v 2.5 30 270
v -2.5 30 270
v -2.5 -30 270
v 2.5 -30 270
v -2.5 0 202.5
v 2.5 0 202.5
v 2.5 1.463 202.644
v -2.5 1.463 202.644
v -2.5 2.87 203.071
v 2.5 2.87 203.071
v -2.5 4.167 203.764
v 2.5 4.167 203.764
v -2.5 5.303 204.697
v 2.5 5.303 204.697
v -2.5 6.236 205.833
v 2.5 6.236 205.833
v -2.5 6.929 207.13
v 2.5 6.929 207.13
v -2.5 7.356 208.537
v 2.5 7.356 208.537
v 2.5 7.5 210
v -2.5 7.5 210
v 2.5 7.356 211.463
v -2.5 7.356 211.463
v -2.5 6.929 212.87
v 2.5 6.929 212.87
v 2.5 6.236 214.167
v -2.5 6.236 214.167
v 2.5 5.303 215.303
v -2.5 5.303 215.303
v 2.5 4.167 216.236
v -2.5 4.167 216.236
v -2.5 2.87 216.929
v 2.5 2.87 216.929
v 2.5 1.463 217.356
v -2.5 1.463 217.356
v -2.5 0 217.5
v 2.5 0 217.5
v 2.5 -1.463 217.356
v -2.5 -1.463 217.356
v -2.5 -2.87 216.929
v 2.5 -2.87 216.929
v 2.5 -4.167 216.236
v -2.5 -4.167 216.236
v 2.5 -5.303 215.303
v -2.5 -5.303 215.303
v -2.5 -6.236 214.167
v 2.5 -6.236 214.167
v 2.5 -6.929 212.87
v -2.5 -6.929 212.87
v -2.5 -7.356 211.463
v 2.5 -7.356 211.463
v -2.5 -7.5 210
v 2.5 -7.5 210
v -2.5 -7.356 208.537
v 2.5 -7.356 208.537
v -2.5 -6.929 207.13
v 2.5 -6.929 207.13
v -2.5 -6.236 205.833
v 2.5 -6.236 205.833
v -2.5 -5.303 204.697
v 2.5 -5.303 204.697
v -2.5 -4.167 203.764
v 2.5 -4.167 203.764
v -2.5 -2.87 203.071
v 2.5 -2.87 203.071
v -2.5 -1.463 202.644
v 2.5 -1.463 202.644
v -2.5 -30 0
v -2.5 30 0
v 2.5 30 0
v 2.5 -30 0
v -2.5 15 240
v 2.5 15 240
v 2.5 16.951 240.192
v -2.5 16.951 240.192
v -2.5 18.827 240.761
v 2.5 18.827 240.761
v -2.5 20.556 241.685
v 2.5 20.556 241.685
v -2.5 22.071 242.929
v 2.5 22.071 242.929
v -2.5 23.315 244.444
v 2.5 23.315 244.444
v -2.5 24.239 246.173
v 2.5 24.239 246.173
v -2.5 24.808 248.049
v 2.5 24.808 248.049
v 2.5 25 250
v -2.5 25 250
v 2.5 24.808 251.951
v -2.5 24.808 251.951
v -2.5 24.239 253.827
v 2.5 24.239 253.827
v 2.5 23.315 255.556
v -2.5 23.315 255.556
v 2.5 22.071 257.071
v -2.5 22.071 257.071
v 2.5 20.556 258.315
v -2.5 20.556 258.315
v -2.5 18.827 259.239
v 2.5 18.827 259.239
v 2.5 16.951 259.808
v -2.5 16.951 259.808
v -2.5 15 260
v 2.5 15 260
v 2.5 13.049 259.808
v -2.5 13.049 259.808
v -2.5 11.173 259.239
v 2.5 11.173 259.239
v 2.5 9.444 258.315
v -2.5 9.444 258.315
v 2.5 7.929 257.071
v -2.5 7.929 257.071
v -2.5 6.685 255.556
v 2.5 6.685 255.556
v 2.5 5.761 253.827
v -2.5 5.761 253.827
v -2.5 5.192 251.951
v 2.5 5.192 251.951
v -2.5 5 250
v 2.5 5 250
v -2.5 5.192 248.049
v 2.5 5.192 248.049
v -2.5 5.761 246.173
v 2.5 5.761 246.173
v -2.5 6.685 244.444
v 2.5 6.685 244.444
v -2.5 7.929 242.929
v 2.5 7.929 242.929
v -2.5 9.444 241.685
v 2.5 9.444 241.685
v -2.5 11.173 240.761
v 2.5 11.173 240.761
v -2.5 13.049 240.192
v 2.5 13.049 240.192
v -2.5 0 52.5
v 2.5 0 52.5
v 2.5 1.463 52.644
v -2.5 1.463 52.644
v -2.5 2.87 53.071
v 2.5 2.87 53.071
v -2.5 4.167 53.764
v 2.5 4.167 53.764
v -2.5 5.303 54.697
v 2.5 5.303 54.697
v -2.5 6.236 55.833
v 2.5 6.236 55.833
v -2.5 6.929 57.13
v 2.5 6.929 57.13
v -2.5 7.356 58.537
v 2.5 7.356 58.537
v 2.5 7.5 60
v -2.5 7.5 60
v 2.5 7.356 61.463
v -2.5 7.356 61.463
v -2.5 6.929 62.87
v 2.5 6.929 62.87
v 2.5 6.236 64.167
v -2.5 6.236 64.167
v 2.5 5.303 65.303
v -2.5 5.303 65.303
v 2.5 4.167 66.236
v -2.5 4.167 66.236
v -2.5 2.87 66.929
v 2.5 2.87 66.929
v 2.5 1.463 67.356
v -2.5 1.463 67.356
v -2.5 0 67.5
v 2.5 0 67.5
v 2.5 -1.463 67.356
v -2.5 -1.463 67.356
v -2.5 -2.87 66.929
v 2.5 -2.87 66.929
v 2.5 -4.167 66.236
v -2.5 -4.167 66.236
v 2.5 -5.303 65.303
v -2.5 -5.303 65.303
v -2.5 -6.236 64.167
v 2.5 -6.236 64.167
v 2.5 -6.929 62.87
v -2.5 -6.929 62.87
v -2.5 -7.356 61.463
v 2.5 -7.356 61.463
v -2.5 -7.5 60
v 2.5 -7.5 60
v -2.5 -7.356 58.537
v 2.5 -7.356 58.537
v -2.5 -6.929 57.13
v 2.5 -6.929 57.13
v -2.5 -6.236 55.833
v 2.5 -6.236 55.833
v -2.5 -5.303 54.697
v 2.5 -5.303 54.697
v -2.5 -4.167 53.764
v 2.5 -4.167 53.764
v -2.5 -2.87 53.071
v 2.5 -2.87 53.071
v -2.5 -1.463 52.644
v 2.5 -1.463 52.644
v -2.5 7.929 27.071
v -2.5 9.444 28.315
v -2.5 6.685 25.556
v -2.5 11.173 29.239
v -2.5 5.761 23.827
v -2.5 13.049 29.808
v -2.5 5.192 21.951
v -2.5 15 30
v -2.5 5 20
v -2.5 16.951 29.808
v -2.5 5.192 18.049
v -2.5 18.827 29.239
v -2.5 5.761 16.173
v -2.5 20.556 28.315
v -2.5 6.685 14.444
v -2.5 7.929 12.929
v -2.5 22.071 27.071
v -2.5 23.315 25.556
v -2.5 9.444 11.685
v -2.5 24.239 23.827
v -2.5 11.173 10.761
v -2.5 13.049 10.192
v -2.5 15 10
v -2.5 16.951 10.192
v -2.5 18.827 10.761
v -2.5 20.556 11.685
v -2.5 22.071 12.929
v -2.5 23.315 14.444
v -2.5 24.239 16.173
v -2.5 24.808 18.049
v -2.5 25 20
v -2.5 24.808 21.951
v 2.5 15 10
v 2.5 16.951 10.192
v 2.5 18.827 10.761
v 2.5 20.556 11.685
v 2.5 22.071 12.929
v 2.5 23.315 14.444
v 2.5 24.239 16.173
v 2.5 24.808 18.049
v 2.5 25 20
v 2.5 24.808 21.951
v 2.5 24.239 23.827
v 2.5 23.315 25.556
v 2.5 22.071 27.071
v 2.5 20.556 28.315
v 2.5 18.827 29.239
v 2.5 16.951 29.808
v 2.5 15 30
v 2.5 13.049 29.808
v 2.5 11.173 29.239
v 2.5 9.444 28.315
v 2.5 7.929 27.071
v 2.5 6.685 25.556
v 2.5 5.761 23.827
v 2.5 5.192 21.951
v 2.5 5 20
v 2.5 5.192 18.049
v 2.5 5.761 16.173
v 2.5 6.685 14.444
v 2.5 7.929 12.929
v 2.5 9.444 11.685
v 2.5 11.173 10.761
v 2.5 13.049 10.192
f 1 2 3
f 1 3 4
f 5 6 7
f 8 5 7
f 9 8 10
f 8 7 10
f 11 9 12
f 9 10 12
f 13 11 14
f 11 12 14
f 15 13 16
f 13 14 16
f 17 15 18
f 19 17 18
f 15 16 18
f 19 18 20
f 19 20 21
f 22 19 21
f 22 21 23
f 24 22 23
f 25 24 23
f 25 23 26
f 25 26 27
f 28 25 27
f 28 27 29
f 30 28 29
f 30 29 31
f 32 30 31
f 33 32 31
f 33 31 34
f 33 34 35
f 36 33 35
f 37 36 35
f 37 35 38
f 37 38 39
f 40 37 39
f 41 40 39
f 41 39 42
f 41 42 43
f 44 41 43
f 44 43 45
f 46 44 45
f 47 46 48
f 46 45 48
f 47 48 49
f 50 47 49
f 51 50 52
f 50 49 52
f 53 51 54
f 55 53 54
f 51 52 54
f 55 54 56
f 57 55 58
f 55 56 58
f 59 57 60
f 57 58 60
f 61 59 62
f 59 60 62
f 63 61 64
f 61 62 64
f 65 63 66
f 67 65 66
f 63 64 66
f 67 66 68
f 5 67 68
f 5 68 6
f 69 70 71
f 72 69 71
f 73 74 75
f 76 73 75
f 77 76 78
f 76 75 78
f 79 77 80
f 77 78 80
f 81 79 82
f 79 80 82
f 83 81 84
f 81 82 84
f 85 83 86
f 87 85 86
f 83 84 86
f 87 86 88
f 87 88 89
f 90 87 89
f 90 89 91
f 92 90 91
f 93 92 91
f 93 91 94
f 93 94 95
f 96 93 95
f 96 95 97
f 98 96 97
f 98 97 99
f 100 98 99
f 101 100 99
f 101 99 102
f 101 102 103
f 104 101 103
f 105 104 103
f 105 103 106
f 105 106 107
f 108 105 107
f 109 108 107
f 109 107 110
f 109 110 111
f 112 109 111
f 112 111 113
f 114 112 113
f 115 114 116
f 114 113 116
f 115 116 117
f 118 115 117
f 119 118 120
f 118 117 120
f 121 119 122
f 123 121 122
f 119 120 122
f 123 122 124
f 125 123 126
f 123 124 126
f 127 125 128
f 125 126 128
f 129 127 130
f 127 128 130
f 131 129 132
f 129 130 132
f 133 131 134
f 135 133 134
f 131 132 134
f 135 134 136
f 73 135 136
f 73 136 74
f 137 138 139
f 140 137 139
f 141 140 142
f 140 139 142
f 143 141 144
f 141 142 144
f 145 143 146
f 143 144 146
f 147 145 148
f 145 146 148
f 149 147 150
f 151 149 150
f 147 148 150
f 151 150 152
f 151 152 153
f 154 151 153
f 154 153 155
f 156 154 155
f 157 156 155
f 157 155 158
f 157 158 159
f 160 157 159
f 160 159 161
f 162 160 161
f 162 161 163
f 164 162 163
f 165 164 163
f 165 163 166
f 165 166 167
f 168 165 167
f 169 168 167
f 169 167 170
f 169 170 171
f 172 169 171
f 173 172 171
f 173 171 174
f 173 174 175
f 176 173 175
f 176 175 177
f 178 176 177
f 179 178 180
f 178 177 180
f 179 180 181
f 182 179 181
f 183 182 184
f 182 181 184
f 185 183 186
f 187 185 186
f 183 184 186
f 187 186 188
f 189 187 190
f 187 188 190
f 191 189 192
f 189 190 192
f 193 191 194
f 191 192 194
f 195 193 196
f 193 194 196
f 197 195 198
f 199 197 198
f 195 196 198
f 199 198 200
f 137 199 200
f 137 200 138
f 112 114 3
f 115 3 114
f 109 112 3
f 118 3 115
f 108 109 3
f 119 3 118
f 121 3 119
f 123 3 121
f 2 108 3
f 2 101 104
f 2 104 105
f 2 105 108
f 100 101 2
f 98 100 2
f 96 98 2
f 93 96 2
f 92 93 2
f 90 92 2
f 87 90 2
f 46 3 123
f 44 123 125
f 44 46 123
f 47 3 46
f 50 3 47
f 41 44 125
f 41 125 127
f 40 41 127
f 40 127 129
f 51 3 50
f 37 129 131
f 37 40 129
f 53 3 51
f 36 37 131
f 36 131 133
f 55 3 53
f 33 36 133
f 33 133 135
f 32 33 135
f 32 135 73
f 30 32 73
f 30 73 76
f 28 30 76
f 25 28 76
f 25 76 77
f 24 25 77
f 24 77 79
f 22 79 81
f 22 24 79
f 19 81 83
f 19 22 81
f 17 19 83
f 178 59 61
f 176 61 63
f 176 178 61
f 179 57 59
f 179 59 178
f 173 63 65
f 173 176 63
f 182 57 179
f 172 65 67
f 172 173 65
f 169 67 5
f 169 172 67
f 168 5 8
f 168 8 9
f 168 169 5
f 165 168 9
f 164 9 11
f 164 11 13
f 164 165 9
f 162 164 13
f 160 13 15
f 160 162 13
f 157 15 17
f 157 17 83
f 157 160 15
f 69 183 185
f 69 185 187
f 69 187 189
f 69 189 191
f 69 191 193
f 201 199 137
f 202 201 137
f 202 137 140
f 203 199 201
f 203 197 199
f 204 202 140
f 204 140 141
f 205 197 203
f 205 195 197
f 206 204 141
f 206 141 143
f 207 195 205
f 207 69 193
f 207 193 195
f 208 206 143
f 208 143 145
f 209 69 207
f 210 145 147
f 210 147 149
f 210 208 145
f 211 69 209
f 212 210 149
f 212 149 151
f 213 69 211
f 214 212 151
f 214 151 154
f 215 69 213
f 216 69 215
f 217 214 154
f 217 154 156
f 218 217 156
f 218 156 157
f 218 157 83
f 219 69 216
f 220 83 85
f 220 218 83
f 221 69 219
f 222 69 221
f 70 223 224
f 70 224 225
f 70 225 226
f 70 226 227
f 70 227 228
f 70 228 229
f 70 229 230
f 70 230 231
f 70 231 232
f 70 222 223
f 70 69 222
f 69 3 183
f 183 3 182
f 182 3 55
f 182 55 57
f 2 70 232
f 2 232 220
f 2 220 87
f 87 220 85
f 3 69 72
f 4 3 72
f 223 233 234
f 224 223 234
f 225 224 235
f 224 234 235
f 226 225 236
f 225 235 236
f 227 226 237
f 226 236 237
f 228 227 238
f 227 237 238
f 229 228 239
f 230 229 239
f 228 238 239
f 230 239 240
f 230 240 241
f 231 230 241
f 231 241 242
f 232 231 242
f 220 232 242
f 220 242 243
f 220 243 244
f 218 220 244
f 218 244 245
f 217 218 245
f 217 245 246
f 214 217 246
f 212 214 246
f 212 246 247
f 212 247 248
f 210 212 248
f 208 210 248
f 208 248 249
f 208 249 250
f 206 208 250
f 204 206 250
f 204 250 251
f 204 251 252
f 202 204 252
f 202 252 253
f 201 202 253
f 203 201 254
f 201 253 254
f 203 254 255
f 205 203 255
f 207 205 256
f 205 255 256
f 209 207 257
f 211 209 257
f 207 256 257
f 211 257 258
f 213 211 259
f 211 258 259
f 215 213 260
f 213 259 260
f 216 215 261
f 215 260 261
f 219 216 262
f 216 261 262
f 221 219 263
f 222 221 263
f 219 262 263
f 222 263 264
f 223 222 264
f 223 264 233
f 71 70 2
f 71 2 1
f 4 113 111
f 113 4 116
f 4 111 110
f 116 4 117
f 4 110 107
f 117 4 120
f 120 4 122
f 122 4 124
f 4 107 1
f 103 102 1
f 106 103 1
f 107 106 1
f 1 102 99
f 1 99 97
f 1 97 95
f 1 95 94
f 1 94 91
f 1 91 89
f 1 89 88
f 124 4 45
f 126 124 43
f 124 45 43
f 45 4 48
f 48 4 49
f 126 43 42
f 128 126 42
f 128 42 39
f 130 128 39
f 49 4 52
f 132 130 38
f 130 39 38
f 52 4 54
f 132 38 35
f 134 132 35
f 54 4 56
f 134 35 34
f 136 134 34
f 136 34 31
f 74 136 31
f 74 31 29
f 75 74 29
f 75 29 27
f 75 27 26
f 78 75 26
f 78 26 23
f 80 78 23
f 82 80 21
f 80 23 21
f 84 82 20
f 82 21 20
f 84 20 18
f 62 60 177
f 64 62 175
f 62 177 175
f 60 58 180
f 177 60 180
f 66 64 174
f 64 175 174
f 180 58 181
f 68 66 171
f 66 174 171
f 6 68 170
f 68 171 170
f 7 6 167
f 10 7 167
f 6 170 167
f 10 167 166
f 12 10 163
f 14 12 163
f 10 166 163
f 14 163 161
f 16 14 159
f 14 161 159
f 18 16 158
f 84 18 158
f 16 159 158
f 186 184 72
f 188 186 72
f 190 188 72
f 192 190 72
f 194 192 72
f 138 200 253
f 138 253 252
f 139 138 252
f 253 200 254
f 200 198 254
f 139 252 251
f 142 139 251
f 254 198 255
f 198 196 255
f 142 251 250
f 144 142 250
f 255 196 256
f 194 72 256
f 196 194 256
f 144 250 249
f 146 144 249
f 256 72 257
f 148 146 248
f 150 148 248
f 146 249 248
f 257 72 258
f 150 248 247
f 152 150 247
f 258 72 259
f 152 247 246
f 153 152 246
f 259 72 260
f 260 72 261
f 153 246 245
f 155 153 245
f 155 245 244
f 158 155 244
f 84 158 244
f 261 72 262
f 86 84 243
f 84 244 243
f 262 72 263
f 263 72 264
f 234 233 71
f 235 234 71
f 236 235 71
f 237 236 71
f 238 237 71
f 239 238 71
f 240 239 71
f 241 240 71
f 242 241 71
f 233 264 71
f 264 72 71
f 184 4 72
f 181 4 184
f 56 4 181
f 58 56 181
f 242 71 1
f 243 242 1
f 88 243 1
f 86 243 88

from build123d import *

# Parameters (mm, degrees)
SKETCH1_W           = 5
SKETCH1_H           = 60
BOSS_EXTRUDE1_DEPTH = 270
CUT_EXTRUDE1_REACH  = 273.708
SKETCH2_R           = 7.5
SKETCH2_R_2         = 10


with BuildPart() as part:
    # Sketch1 → Boss-Extrude1 (new body)
    with BuildSketch(Plane.XY):
        Rectangle(SKETCH1_W, SKETCH1_H)
    extrude(amount=BOSS_EXTRUDE1_DEPTH)

    # Sketch2 → Cut-Extrude1 (cut, up to next)
    with BuildSketch(Plane(origin=(2.5, 0, 0), x_dir=(0, 0, -1), z_dir=(1, 0, 0)), mode=Mode.PRIVATE) as cut_extrude1_sk1:
        with Locations((-60, 0)):
            Circle(SKETCH2_R)
    cut_extrude1_tool1 = extrude(cut_extrude1_sk1.sketch, amount=-CUT_EXTRUDE1_REACH, mode=Mode.PRIVATE) & part.part
    # Sketch2 → Cut-Extrude1 (cut, up to next)
    with BuildSketch(Plane(origin=(2.5, 0, 0), x_dir=(0, 0, -1), z_dir=(1, 0, 0)), mode=Mode.PRIVATE) as cut_extrude1_sk2:
        with Locations((-210, 0)):
            Circle(SKETCH2_R)
    cut_extrude1_tool2 = extrude(cut_extrude1_sk2.sketch, amount=-CUT_EXTRUDE1_REACH, mode=Mode.PRIVATE) & part.part
    # Sketch2 → Cut-Extrude1 (cut, up to next)
    with BuildSketch(Plane(origin=(2.5, 0, 0), x_dir=(0, 0, -1), z_dir=(1, 0, 0)), mode=Mode.PRIVATE) as cut_extrude1_sk3:
        with Locations((-250, 15)):
            Circle(SKETCH2_R_2)
    cut_extrude1_tool3 = extrude(cut_extrude1_sk3.sketch, amount=-CUT_EXTRUDE1_REACH, mode=Mode.PRIVATE) & part.part
    # Sketch2 → Cut-Extrude1 (cut, up to next)
    with BuildSketch(Plane(origin=(2.5, 0, 0), x_dir=(0, 0, -1), z_dir=(1, 0, 0)), mode=Mode.PRIVATE) as cut_extrude1_sk4:
        with Locations((-20, 15)):
            Circle(SKETCH2_R_2)
    cut_extrude1_tool4 = extrude(cut_extrude1_sk4.sketch, amount=-CUT_EXTRUDE1_REACH, mode=Mode.PRIVATE) & part.part
    add(cut_extrude1_tool1.solids().sort_by_distance((2.5, 0, 60))[0], mode=Mode.SUBTRACT)
    add(cut_extrude1_tool2.solids().sort_by_distance((2.5, 0, 210))[0], mode=Mode.SUBTRACT)
    add(cut_extrude1_tool3.solids().sort_by_distance((2.5, 15, 250))[0], mode=Mode.SUBTRACT)
    add(cut_extrude1_tool4.solids().sort_by_distance((2.5, 15, 20))[0], mode=Mode.SUBTRACT)


solid = part.part
